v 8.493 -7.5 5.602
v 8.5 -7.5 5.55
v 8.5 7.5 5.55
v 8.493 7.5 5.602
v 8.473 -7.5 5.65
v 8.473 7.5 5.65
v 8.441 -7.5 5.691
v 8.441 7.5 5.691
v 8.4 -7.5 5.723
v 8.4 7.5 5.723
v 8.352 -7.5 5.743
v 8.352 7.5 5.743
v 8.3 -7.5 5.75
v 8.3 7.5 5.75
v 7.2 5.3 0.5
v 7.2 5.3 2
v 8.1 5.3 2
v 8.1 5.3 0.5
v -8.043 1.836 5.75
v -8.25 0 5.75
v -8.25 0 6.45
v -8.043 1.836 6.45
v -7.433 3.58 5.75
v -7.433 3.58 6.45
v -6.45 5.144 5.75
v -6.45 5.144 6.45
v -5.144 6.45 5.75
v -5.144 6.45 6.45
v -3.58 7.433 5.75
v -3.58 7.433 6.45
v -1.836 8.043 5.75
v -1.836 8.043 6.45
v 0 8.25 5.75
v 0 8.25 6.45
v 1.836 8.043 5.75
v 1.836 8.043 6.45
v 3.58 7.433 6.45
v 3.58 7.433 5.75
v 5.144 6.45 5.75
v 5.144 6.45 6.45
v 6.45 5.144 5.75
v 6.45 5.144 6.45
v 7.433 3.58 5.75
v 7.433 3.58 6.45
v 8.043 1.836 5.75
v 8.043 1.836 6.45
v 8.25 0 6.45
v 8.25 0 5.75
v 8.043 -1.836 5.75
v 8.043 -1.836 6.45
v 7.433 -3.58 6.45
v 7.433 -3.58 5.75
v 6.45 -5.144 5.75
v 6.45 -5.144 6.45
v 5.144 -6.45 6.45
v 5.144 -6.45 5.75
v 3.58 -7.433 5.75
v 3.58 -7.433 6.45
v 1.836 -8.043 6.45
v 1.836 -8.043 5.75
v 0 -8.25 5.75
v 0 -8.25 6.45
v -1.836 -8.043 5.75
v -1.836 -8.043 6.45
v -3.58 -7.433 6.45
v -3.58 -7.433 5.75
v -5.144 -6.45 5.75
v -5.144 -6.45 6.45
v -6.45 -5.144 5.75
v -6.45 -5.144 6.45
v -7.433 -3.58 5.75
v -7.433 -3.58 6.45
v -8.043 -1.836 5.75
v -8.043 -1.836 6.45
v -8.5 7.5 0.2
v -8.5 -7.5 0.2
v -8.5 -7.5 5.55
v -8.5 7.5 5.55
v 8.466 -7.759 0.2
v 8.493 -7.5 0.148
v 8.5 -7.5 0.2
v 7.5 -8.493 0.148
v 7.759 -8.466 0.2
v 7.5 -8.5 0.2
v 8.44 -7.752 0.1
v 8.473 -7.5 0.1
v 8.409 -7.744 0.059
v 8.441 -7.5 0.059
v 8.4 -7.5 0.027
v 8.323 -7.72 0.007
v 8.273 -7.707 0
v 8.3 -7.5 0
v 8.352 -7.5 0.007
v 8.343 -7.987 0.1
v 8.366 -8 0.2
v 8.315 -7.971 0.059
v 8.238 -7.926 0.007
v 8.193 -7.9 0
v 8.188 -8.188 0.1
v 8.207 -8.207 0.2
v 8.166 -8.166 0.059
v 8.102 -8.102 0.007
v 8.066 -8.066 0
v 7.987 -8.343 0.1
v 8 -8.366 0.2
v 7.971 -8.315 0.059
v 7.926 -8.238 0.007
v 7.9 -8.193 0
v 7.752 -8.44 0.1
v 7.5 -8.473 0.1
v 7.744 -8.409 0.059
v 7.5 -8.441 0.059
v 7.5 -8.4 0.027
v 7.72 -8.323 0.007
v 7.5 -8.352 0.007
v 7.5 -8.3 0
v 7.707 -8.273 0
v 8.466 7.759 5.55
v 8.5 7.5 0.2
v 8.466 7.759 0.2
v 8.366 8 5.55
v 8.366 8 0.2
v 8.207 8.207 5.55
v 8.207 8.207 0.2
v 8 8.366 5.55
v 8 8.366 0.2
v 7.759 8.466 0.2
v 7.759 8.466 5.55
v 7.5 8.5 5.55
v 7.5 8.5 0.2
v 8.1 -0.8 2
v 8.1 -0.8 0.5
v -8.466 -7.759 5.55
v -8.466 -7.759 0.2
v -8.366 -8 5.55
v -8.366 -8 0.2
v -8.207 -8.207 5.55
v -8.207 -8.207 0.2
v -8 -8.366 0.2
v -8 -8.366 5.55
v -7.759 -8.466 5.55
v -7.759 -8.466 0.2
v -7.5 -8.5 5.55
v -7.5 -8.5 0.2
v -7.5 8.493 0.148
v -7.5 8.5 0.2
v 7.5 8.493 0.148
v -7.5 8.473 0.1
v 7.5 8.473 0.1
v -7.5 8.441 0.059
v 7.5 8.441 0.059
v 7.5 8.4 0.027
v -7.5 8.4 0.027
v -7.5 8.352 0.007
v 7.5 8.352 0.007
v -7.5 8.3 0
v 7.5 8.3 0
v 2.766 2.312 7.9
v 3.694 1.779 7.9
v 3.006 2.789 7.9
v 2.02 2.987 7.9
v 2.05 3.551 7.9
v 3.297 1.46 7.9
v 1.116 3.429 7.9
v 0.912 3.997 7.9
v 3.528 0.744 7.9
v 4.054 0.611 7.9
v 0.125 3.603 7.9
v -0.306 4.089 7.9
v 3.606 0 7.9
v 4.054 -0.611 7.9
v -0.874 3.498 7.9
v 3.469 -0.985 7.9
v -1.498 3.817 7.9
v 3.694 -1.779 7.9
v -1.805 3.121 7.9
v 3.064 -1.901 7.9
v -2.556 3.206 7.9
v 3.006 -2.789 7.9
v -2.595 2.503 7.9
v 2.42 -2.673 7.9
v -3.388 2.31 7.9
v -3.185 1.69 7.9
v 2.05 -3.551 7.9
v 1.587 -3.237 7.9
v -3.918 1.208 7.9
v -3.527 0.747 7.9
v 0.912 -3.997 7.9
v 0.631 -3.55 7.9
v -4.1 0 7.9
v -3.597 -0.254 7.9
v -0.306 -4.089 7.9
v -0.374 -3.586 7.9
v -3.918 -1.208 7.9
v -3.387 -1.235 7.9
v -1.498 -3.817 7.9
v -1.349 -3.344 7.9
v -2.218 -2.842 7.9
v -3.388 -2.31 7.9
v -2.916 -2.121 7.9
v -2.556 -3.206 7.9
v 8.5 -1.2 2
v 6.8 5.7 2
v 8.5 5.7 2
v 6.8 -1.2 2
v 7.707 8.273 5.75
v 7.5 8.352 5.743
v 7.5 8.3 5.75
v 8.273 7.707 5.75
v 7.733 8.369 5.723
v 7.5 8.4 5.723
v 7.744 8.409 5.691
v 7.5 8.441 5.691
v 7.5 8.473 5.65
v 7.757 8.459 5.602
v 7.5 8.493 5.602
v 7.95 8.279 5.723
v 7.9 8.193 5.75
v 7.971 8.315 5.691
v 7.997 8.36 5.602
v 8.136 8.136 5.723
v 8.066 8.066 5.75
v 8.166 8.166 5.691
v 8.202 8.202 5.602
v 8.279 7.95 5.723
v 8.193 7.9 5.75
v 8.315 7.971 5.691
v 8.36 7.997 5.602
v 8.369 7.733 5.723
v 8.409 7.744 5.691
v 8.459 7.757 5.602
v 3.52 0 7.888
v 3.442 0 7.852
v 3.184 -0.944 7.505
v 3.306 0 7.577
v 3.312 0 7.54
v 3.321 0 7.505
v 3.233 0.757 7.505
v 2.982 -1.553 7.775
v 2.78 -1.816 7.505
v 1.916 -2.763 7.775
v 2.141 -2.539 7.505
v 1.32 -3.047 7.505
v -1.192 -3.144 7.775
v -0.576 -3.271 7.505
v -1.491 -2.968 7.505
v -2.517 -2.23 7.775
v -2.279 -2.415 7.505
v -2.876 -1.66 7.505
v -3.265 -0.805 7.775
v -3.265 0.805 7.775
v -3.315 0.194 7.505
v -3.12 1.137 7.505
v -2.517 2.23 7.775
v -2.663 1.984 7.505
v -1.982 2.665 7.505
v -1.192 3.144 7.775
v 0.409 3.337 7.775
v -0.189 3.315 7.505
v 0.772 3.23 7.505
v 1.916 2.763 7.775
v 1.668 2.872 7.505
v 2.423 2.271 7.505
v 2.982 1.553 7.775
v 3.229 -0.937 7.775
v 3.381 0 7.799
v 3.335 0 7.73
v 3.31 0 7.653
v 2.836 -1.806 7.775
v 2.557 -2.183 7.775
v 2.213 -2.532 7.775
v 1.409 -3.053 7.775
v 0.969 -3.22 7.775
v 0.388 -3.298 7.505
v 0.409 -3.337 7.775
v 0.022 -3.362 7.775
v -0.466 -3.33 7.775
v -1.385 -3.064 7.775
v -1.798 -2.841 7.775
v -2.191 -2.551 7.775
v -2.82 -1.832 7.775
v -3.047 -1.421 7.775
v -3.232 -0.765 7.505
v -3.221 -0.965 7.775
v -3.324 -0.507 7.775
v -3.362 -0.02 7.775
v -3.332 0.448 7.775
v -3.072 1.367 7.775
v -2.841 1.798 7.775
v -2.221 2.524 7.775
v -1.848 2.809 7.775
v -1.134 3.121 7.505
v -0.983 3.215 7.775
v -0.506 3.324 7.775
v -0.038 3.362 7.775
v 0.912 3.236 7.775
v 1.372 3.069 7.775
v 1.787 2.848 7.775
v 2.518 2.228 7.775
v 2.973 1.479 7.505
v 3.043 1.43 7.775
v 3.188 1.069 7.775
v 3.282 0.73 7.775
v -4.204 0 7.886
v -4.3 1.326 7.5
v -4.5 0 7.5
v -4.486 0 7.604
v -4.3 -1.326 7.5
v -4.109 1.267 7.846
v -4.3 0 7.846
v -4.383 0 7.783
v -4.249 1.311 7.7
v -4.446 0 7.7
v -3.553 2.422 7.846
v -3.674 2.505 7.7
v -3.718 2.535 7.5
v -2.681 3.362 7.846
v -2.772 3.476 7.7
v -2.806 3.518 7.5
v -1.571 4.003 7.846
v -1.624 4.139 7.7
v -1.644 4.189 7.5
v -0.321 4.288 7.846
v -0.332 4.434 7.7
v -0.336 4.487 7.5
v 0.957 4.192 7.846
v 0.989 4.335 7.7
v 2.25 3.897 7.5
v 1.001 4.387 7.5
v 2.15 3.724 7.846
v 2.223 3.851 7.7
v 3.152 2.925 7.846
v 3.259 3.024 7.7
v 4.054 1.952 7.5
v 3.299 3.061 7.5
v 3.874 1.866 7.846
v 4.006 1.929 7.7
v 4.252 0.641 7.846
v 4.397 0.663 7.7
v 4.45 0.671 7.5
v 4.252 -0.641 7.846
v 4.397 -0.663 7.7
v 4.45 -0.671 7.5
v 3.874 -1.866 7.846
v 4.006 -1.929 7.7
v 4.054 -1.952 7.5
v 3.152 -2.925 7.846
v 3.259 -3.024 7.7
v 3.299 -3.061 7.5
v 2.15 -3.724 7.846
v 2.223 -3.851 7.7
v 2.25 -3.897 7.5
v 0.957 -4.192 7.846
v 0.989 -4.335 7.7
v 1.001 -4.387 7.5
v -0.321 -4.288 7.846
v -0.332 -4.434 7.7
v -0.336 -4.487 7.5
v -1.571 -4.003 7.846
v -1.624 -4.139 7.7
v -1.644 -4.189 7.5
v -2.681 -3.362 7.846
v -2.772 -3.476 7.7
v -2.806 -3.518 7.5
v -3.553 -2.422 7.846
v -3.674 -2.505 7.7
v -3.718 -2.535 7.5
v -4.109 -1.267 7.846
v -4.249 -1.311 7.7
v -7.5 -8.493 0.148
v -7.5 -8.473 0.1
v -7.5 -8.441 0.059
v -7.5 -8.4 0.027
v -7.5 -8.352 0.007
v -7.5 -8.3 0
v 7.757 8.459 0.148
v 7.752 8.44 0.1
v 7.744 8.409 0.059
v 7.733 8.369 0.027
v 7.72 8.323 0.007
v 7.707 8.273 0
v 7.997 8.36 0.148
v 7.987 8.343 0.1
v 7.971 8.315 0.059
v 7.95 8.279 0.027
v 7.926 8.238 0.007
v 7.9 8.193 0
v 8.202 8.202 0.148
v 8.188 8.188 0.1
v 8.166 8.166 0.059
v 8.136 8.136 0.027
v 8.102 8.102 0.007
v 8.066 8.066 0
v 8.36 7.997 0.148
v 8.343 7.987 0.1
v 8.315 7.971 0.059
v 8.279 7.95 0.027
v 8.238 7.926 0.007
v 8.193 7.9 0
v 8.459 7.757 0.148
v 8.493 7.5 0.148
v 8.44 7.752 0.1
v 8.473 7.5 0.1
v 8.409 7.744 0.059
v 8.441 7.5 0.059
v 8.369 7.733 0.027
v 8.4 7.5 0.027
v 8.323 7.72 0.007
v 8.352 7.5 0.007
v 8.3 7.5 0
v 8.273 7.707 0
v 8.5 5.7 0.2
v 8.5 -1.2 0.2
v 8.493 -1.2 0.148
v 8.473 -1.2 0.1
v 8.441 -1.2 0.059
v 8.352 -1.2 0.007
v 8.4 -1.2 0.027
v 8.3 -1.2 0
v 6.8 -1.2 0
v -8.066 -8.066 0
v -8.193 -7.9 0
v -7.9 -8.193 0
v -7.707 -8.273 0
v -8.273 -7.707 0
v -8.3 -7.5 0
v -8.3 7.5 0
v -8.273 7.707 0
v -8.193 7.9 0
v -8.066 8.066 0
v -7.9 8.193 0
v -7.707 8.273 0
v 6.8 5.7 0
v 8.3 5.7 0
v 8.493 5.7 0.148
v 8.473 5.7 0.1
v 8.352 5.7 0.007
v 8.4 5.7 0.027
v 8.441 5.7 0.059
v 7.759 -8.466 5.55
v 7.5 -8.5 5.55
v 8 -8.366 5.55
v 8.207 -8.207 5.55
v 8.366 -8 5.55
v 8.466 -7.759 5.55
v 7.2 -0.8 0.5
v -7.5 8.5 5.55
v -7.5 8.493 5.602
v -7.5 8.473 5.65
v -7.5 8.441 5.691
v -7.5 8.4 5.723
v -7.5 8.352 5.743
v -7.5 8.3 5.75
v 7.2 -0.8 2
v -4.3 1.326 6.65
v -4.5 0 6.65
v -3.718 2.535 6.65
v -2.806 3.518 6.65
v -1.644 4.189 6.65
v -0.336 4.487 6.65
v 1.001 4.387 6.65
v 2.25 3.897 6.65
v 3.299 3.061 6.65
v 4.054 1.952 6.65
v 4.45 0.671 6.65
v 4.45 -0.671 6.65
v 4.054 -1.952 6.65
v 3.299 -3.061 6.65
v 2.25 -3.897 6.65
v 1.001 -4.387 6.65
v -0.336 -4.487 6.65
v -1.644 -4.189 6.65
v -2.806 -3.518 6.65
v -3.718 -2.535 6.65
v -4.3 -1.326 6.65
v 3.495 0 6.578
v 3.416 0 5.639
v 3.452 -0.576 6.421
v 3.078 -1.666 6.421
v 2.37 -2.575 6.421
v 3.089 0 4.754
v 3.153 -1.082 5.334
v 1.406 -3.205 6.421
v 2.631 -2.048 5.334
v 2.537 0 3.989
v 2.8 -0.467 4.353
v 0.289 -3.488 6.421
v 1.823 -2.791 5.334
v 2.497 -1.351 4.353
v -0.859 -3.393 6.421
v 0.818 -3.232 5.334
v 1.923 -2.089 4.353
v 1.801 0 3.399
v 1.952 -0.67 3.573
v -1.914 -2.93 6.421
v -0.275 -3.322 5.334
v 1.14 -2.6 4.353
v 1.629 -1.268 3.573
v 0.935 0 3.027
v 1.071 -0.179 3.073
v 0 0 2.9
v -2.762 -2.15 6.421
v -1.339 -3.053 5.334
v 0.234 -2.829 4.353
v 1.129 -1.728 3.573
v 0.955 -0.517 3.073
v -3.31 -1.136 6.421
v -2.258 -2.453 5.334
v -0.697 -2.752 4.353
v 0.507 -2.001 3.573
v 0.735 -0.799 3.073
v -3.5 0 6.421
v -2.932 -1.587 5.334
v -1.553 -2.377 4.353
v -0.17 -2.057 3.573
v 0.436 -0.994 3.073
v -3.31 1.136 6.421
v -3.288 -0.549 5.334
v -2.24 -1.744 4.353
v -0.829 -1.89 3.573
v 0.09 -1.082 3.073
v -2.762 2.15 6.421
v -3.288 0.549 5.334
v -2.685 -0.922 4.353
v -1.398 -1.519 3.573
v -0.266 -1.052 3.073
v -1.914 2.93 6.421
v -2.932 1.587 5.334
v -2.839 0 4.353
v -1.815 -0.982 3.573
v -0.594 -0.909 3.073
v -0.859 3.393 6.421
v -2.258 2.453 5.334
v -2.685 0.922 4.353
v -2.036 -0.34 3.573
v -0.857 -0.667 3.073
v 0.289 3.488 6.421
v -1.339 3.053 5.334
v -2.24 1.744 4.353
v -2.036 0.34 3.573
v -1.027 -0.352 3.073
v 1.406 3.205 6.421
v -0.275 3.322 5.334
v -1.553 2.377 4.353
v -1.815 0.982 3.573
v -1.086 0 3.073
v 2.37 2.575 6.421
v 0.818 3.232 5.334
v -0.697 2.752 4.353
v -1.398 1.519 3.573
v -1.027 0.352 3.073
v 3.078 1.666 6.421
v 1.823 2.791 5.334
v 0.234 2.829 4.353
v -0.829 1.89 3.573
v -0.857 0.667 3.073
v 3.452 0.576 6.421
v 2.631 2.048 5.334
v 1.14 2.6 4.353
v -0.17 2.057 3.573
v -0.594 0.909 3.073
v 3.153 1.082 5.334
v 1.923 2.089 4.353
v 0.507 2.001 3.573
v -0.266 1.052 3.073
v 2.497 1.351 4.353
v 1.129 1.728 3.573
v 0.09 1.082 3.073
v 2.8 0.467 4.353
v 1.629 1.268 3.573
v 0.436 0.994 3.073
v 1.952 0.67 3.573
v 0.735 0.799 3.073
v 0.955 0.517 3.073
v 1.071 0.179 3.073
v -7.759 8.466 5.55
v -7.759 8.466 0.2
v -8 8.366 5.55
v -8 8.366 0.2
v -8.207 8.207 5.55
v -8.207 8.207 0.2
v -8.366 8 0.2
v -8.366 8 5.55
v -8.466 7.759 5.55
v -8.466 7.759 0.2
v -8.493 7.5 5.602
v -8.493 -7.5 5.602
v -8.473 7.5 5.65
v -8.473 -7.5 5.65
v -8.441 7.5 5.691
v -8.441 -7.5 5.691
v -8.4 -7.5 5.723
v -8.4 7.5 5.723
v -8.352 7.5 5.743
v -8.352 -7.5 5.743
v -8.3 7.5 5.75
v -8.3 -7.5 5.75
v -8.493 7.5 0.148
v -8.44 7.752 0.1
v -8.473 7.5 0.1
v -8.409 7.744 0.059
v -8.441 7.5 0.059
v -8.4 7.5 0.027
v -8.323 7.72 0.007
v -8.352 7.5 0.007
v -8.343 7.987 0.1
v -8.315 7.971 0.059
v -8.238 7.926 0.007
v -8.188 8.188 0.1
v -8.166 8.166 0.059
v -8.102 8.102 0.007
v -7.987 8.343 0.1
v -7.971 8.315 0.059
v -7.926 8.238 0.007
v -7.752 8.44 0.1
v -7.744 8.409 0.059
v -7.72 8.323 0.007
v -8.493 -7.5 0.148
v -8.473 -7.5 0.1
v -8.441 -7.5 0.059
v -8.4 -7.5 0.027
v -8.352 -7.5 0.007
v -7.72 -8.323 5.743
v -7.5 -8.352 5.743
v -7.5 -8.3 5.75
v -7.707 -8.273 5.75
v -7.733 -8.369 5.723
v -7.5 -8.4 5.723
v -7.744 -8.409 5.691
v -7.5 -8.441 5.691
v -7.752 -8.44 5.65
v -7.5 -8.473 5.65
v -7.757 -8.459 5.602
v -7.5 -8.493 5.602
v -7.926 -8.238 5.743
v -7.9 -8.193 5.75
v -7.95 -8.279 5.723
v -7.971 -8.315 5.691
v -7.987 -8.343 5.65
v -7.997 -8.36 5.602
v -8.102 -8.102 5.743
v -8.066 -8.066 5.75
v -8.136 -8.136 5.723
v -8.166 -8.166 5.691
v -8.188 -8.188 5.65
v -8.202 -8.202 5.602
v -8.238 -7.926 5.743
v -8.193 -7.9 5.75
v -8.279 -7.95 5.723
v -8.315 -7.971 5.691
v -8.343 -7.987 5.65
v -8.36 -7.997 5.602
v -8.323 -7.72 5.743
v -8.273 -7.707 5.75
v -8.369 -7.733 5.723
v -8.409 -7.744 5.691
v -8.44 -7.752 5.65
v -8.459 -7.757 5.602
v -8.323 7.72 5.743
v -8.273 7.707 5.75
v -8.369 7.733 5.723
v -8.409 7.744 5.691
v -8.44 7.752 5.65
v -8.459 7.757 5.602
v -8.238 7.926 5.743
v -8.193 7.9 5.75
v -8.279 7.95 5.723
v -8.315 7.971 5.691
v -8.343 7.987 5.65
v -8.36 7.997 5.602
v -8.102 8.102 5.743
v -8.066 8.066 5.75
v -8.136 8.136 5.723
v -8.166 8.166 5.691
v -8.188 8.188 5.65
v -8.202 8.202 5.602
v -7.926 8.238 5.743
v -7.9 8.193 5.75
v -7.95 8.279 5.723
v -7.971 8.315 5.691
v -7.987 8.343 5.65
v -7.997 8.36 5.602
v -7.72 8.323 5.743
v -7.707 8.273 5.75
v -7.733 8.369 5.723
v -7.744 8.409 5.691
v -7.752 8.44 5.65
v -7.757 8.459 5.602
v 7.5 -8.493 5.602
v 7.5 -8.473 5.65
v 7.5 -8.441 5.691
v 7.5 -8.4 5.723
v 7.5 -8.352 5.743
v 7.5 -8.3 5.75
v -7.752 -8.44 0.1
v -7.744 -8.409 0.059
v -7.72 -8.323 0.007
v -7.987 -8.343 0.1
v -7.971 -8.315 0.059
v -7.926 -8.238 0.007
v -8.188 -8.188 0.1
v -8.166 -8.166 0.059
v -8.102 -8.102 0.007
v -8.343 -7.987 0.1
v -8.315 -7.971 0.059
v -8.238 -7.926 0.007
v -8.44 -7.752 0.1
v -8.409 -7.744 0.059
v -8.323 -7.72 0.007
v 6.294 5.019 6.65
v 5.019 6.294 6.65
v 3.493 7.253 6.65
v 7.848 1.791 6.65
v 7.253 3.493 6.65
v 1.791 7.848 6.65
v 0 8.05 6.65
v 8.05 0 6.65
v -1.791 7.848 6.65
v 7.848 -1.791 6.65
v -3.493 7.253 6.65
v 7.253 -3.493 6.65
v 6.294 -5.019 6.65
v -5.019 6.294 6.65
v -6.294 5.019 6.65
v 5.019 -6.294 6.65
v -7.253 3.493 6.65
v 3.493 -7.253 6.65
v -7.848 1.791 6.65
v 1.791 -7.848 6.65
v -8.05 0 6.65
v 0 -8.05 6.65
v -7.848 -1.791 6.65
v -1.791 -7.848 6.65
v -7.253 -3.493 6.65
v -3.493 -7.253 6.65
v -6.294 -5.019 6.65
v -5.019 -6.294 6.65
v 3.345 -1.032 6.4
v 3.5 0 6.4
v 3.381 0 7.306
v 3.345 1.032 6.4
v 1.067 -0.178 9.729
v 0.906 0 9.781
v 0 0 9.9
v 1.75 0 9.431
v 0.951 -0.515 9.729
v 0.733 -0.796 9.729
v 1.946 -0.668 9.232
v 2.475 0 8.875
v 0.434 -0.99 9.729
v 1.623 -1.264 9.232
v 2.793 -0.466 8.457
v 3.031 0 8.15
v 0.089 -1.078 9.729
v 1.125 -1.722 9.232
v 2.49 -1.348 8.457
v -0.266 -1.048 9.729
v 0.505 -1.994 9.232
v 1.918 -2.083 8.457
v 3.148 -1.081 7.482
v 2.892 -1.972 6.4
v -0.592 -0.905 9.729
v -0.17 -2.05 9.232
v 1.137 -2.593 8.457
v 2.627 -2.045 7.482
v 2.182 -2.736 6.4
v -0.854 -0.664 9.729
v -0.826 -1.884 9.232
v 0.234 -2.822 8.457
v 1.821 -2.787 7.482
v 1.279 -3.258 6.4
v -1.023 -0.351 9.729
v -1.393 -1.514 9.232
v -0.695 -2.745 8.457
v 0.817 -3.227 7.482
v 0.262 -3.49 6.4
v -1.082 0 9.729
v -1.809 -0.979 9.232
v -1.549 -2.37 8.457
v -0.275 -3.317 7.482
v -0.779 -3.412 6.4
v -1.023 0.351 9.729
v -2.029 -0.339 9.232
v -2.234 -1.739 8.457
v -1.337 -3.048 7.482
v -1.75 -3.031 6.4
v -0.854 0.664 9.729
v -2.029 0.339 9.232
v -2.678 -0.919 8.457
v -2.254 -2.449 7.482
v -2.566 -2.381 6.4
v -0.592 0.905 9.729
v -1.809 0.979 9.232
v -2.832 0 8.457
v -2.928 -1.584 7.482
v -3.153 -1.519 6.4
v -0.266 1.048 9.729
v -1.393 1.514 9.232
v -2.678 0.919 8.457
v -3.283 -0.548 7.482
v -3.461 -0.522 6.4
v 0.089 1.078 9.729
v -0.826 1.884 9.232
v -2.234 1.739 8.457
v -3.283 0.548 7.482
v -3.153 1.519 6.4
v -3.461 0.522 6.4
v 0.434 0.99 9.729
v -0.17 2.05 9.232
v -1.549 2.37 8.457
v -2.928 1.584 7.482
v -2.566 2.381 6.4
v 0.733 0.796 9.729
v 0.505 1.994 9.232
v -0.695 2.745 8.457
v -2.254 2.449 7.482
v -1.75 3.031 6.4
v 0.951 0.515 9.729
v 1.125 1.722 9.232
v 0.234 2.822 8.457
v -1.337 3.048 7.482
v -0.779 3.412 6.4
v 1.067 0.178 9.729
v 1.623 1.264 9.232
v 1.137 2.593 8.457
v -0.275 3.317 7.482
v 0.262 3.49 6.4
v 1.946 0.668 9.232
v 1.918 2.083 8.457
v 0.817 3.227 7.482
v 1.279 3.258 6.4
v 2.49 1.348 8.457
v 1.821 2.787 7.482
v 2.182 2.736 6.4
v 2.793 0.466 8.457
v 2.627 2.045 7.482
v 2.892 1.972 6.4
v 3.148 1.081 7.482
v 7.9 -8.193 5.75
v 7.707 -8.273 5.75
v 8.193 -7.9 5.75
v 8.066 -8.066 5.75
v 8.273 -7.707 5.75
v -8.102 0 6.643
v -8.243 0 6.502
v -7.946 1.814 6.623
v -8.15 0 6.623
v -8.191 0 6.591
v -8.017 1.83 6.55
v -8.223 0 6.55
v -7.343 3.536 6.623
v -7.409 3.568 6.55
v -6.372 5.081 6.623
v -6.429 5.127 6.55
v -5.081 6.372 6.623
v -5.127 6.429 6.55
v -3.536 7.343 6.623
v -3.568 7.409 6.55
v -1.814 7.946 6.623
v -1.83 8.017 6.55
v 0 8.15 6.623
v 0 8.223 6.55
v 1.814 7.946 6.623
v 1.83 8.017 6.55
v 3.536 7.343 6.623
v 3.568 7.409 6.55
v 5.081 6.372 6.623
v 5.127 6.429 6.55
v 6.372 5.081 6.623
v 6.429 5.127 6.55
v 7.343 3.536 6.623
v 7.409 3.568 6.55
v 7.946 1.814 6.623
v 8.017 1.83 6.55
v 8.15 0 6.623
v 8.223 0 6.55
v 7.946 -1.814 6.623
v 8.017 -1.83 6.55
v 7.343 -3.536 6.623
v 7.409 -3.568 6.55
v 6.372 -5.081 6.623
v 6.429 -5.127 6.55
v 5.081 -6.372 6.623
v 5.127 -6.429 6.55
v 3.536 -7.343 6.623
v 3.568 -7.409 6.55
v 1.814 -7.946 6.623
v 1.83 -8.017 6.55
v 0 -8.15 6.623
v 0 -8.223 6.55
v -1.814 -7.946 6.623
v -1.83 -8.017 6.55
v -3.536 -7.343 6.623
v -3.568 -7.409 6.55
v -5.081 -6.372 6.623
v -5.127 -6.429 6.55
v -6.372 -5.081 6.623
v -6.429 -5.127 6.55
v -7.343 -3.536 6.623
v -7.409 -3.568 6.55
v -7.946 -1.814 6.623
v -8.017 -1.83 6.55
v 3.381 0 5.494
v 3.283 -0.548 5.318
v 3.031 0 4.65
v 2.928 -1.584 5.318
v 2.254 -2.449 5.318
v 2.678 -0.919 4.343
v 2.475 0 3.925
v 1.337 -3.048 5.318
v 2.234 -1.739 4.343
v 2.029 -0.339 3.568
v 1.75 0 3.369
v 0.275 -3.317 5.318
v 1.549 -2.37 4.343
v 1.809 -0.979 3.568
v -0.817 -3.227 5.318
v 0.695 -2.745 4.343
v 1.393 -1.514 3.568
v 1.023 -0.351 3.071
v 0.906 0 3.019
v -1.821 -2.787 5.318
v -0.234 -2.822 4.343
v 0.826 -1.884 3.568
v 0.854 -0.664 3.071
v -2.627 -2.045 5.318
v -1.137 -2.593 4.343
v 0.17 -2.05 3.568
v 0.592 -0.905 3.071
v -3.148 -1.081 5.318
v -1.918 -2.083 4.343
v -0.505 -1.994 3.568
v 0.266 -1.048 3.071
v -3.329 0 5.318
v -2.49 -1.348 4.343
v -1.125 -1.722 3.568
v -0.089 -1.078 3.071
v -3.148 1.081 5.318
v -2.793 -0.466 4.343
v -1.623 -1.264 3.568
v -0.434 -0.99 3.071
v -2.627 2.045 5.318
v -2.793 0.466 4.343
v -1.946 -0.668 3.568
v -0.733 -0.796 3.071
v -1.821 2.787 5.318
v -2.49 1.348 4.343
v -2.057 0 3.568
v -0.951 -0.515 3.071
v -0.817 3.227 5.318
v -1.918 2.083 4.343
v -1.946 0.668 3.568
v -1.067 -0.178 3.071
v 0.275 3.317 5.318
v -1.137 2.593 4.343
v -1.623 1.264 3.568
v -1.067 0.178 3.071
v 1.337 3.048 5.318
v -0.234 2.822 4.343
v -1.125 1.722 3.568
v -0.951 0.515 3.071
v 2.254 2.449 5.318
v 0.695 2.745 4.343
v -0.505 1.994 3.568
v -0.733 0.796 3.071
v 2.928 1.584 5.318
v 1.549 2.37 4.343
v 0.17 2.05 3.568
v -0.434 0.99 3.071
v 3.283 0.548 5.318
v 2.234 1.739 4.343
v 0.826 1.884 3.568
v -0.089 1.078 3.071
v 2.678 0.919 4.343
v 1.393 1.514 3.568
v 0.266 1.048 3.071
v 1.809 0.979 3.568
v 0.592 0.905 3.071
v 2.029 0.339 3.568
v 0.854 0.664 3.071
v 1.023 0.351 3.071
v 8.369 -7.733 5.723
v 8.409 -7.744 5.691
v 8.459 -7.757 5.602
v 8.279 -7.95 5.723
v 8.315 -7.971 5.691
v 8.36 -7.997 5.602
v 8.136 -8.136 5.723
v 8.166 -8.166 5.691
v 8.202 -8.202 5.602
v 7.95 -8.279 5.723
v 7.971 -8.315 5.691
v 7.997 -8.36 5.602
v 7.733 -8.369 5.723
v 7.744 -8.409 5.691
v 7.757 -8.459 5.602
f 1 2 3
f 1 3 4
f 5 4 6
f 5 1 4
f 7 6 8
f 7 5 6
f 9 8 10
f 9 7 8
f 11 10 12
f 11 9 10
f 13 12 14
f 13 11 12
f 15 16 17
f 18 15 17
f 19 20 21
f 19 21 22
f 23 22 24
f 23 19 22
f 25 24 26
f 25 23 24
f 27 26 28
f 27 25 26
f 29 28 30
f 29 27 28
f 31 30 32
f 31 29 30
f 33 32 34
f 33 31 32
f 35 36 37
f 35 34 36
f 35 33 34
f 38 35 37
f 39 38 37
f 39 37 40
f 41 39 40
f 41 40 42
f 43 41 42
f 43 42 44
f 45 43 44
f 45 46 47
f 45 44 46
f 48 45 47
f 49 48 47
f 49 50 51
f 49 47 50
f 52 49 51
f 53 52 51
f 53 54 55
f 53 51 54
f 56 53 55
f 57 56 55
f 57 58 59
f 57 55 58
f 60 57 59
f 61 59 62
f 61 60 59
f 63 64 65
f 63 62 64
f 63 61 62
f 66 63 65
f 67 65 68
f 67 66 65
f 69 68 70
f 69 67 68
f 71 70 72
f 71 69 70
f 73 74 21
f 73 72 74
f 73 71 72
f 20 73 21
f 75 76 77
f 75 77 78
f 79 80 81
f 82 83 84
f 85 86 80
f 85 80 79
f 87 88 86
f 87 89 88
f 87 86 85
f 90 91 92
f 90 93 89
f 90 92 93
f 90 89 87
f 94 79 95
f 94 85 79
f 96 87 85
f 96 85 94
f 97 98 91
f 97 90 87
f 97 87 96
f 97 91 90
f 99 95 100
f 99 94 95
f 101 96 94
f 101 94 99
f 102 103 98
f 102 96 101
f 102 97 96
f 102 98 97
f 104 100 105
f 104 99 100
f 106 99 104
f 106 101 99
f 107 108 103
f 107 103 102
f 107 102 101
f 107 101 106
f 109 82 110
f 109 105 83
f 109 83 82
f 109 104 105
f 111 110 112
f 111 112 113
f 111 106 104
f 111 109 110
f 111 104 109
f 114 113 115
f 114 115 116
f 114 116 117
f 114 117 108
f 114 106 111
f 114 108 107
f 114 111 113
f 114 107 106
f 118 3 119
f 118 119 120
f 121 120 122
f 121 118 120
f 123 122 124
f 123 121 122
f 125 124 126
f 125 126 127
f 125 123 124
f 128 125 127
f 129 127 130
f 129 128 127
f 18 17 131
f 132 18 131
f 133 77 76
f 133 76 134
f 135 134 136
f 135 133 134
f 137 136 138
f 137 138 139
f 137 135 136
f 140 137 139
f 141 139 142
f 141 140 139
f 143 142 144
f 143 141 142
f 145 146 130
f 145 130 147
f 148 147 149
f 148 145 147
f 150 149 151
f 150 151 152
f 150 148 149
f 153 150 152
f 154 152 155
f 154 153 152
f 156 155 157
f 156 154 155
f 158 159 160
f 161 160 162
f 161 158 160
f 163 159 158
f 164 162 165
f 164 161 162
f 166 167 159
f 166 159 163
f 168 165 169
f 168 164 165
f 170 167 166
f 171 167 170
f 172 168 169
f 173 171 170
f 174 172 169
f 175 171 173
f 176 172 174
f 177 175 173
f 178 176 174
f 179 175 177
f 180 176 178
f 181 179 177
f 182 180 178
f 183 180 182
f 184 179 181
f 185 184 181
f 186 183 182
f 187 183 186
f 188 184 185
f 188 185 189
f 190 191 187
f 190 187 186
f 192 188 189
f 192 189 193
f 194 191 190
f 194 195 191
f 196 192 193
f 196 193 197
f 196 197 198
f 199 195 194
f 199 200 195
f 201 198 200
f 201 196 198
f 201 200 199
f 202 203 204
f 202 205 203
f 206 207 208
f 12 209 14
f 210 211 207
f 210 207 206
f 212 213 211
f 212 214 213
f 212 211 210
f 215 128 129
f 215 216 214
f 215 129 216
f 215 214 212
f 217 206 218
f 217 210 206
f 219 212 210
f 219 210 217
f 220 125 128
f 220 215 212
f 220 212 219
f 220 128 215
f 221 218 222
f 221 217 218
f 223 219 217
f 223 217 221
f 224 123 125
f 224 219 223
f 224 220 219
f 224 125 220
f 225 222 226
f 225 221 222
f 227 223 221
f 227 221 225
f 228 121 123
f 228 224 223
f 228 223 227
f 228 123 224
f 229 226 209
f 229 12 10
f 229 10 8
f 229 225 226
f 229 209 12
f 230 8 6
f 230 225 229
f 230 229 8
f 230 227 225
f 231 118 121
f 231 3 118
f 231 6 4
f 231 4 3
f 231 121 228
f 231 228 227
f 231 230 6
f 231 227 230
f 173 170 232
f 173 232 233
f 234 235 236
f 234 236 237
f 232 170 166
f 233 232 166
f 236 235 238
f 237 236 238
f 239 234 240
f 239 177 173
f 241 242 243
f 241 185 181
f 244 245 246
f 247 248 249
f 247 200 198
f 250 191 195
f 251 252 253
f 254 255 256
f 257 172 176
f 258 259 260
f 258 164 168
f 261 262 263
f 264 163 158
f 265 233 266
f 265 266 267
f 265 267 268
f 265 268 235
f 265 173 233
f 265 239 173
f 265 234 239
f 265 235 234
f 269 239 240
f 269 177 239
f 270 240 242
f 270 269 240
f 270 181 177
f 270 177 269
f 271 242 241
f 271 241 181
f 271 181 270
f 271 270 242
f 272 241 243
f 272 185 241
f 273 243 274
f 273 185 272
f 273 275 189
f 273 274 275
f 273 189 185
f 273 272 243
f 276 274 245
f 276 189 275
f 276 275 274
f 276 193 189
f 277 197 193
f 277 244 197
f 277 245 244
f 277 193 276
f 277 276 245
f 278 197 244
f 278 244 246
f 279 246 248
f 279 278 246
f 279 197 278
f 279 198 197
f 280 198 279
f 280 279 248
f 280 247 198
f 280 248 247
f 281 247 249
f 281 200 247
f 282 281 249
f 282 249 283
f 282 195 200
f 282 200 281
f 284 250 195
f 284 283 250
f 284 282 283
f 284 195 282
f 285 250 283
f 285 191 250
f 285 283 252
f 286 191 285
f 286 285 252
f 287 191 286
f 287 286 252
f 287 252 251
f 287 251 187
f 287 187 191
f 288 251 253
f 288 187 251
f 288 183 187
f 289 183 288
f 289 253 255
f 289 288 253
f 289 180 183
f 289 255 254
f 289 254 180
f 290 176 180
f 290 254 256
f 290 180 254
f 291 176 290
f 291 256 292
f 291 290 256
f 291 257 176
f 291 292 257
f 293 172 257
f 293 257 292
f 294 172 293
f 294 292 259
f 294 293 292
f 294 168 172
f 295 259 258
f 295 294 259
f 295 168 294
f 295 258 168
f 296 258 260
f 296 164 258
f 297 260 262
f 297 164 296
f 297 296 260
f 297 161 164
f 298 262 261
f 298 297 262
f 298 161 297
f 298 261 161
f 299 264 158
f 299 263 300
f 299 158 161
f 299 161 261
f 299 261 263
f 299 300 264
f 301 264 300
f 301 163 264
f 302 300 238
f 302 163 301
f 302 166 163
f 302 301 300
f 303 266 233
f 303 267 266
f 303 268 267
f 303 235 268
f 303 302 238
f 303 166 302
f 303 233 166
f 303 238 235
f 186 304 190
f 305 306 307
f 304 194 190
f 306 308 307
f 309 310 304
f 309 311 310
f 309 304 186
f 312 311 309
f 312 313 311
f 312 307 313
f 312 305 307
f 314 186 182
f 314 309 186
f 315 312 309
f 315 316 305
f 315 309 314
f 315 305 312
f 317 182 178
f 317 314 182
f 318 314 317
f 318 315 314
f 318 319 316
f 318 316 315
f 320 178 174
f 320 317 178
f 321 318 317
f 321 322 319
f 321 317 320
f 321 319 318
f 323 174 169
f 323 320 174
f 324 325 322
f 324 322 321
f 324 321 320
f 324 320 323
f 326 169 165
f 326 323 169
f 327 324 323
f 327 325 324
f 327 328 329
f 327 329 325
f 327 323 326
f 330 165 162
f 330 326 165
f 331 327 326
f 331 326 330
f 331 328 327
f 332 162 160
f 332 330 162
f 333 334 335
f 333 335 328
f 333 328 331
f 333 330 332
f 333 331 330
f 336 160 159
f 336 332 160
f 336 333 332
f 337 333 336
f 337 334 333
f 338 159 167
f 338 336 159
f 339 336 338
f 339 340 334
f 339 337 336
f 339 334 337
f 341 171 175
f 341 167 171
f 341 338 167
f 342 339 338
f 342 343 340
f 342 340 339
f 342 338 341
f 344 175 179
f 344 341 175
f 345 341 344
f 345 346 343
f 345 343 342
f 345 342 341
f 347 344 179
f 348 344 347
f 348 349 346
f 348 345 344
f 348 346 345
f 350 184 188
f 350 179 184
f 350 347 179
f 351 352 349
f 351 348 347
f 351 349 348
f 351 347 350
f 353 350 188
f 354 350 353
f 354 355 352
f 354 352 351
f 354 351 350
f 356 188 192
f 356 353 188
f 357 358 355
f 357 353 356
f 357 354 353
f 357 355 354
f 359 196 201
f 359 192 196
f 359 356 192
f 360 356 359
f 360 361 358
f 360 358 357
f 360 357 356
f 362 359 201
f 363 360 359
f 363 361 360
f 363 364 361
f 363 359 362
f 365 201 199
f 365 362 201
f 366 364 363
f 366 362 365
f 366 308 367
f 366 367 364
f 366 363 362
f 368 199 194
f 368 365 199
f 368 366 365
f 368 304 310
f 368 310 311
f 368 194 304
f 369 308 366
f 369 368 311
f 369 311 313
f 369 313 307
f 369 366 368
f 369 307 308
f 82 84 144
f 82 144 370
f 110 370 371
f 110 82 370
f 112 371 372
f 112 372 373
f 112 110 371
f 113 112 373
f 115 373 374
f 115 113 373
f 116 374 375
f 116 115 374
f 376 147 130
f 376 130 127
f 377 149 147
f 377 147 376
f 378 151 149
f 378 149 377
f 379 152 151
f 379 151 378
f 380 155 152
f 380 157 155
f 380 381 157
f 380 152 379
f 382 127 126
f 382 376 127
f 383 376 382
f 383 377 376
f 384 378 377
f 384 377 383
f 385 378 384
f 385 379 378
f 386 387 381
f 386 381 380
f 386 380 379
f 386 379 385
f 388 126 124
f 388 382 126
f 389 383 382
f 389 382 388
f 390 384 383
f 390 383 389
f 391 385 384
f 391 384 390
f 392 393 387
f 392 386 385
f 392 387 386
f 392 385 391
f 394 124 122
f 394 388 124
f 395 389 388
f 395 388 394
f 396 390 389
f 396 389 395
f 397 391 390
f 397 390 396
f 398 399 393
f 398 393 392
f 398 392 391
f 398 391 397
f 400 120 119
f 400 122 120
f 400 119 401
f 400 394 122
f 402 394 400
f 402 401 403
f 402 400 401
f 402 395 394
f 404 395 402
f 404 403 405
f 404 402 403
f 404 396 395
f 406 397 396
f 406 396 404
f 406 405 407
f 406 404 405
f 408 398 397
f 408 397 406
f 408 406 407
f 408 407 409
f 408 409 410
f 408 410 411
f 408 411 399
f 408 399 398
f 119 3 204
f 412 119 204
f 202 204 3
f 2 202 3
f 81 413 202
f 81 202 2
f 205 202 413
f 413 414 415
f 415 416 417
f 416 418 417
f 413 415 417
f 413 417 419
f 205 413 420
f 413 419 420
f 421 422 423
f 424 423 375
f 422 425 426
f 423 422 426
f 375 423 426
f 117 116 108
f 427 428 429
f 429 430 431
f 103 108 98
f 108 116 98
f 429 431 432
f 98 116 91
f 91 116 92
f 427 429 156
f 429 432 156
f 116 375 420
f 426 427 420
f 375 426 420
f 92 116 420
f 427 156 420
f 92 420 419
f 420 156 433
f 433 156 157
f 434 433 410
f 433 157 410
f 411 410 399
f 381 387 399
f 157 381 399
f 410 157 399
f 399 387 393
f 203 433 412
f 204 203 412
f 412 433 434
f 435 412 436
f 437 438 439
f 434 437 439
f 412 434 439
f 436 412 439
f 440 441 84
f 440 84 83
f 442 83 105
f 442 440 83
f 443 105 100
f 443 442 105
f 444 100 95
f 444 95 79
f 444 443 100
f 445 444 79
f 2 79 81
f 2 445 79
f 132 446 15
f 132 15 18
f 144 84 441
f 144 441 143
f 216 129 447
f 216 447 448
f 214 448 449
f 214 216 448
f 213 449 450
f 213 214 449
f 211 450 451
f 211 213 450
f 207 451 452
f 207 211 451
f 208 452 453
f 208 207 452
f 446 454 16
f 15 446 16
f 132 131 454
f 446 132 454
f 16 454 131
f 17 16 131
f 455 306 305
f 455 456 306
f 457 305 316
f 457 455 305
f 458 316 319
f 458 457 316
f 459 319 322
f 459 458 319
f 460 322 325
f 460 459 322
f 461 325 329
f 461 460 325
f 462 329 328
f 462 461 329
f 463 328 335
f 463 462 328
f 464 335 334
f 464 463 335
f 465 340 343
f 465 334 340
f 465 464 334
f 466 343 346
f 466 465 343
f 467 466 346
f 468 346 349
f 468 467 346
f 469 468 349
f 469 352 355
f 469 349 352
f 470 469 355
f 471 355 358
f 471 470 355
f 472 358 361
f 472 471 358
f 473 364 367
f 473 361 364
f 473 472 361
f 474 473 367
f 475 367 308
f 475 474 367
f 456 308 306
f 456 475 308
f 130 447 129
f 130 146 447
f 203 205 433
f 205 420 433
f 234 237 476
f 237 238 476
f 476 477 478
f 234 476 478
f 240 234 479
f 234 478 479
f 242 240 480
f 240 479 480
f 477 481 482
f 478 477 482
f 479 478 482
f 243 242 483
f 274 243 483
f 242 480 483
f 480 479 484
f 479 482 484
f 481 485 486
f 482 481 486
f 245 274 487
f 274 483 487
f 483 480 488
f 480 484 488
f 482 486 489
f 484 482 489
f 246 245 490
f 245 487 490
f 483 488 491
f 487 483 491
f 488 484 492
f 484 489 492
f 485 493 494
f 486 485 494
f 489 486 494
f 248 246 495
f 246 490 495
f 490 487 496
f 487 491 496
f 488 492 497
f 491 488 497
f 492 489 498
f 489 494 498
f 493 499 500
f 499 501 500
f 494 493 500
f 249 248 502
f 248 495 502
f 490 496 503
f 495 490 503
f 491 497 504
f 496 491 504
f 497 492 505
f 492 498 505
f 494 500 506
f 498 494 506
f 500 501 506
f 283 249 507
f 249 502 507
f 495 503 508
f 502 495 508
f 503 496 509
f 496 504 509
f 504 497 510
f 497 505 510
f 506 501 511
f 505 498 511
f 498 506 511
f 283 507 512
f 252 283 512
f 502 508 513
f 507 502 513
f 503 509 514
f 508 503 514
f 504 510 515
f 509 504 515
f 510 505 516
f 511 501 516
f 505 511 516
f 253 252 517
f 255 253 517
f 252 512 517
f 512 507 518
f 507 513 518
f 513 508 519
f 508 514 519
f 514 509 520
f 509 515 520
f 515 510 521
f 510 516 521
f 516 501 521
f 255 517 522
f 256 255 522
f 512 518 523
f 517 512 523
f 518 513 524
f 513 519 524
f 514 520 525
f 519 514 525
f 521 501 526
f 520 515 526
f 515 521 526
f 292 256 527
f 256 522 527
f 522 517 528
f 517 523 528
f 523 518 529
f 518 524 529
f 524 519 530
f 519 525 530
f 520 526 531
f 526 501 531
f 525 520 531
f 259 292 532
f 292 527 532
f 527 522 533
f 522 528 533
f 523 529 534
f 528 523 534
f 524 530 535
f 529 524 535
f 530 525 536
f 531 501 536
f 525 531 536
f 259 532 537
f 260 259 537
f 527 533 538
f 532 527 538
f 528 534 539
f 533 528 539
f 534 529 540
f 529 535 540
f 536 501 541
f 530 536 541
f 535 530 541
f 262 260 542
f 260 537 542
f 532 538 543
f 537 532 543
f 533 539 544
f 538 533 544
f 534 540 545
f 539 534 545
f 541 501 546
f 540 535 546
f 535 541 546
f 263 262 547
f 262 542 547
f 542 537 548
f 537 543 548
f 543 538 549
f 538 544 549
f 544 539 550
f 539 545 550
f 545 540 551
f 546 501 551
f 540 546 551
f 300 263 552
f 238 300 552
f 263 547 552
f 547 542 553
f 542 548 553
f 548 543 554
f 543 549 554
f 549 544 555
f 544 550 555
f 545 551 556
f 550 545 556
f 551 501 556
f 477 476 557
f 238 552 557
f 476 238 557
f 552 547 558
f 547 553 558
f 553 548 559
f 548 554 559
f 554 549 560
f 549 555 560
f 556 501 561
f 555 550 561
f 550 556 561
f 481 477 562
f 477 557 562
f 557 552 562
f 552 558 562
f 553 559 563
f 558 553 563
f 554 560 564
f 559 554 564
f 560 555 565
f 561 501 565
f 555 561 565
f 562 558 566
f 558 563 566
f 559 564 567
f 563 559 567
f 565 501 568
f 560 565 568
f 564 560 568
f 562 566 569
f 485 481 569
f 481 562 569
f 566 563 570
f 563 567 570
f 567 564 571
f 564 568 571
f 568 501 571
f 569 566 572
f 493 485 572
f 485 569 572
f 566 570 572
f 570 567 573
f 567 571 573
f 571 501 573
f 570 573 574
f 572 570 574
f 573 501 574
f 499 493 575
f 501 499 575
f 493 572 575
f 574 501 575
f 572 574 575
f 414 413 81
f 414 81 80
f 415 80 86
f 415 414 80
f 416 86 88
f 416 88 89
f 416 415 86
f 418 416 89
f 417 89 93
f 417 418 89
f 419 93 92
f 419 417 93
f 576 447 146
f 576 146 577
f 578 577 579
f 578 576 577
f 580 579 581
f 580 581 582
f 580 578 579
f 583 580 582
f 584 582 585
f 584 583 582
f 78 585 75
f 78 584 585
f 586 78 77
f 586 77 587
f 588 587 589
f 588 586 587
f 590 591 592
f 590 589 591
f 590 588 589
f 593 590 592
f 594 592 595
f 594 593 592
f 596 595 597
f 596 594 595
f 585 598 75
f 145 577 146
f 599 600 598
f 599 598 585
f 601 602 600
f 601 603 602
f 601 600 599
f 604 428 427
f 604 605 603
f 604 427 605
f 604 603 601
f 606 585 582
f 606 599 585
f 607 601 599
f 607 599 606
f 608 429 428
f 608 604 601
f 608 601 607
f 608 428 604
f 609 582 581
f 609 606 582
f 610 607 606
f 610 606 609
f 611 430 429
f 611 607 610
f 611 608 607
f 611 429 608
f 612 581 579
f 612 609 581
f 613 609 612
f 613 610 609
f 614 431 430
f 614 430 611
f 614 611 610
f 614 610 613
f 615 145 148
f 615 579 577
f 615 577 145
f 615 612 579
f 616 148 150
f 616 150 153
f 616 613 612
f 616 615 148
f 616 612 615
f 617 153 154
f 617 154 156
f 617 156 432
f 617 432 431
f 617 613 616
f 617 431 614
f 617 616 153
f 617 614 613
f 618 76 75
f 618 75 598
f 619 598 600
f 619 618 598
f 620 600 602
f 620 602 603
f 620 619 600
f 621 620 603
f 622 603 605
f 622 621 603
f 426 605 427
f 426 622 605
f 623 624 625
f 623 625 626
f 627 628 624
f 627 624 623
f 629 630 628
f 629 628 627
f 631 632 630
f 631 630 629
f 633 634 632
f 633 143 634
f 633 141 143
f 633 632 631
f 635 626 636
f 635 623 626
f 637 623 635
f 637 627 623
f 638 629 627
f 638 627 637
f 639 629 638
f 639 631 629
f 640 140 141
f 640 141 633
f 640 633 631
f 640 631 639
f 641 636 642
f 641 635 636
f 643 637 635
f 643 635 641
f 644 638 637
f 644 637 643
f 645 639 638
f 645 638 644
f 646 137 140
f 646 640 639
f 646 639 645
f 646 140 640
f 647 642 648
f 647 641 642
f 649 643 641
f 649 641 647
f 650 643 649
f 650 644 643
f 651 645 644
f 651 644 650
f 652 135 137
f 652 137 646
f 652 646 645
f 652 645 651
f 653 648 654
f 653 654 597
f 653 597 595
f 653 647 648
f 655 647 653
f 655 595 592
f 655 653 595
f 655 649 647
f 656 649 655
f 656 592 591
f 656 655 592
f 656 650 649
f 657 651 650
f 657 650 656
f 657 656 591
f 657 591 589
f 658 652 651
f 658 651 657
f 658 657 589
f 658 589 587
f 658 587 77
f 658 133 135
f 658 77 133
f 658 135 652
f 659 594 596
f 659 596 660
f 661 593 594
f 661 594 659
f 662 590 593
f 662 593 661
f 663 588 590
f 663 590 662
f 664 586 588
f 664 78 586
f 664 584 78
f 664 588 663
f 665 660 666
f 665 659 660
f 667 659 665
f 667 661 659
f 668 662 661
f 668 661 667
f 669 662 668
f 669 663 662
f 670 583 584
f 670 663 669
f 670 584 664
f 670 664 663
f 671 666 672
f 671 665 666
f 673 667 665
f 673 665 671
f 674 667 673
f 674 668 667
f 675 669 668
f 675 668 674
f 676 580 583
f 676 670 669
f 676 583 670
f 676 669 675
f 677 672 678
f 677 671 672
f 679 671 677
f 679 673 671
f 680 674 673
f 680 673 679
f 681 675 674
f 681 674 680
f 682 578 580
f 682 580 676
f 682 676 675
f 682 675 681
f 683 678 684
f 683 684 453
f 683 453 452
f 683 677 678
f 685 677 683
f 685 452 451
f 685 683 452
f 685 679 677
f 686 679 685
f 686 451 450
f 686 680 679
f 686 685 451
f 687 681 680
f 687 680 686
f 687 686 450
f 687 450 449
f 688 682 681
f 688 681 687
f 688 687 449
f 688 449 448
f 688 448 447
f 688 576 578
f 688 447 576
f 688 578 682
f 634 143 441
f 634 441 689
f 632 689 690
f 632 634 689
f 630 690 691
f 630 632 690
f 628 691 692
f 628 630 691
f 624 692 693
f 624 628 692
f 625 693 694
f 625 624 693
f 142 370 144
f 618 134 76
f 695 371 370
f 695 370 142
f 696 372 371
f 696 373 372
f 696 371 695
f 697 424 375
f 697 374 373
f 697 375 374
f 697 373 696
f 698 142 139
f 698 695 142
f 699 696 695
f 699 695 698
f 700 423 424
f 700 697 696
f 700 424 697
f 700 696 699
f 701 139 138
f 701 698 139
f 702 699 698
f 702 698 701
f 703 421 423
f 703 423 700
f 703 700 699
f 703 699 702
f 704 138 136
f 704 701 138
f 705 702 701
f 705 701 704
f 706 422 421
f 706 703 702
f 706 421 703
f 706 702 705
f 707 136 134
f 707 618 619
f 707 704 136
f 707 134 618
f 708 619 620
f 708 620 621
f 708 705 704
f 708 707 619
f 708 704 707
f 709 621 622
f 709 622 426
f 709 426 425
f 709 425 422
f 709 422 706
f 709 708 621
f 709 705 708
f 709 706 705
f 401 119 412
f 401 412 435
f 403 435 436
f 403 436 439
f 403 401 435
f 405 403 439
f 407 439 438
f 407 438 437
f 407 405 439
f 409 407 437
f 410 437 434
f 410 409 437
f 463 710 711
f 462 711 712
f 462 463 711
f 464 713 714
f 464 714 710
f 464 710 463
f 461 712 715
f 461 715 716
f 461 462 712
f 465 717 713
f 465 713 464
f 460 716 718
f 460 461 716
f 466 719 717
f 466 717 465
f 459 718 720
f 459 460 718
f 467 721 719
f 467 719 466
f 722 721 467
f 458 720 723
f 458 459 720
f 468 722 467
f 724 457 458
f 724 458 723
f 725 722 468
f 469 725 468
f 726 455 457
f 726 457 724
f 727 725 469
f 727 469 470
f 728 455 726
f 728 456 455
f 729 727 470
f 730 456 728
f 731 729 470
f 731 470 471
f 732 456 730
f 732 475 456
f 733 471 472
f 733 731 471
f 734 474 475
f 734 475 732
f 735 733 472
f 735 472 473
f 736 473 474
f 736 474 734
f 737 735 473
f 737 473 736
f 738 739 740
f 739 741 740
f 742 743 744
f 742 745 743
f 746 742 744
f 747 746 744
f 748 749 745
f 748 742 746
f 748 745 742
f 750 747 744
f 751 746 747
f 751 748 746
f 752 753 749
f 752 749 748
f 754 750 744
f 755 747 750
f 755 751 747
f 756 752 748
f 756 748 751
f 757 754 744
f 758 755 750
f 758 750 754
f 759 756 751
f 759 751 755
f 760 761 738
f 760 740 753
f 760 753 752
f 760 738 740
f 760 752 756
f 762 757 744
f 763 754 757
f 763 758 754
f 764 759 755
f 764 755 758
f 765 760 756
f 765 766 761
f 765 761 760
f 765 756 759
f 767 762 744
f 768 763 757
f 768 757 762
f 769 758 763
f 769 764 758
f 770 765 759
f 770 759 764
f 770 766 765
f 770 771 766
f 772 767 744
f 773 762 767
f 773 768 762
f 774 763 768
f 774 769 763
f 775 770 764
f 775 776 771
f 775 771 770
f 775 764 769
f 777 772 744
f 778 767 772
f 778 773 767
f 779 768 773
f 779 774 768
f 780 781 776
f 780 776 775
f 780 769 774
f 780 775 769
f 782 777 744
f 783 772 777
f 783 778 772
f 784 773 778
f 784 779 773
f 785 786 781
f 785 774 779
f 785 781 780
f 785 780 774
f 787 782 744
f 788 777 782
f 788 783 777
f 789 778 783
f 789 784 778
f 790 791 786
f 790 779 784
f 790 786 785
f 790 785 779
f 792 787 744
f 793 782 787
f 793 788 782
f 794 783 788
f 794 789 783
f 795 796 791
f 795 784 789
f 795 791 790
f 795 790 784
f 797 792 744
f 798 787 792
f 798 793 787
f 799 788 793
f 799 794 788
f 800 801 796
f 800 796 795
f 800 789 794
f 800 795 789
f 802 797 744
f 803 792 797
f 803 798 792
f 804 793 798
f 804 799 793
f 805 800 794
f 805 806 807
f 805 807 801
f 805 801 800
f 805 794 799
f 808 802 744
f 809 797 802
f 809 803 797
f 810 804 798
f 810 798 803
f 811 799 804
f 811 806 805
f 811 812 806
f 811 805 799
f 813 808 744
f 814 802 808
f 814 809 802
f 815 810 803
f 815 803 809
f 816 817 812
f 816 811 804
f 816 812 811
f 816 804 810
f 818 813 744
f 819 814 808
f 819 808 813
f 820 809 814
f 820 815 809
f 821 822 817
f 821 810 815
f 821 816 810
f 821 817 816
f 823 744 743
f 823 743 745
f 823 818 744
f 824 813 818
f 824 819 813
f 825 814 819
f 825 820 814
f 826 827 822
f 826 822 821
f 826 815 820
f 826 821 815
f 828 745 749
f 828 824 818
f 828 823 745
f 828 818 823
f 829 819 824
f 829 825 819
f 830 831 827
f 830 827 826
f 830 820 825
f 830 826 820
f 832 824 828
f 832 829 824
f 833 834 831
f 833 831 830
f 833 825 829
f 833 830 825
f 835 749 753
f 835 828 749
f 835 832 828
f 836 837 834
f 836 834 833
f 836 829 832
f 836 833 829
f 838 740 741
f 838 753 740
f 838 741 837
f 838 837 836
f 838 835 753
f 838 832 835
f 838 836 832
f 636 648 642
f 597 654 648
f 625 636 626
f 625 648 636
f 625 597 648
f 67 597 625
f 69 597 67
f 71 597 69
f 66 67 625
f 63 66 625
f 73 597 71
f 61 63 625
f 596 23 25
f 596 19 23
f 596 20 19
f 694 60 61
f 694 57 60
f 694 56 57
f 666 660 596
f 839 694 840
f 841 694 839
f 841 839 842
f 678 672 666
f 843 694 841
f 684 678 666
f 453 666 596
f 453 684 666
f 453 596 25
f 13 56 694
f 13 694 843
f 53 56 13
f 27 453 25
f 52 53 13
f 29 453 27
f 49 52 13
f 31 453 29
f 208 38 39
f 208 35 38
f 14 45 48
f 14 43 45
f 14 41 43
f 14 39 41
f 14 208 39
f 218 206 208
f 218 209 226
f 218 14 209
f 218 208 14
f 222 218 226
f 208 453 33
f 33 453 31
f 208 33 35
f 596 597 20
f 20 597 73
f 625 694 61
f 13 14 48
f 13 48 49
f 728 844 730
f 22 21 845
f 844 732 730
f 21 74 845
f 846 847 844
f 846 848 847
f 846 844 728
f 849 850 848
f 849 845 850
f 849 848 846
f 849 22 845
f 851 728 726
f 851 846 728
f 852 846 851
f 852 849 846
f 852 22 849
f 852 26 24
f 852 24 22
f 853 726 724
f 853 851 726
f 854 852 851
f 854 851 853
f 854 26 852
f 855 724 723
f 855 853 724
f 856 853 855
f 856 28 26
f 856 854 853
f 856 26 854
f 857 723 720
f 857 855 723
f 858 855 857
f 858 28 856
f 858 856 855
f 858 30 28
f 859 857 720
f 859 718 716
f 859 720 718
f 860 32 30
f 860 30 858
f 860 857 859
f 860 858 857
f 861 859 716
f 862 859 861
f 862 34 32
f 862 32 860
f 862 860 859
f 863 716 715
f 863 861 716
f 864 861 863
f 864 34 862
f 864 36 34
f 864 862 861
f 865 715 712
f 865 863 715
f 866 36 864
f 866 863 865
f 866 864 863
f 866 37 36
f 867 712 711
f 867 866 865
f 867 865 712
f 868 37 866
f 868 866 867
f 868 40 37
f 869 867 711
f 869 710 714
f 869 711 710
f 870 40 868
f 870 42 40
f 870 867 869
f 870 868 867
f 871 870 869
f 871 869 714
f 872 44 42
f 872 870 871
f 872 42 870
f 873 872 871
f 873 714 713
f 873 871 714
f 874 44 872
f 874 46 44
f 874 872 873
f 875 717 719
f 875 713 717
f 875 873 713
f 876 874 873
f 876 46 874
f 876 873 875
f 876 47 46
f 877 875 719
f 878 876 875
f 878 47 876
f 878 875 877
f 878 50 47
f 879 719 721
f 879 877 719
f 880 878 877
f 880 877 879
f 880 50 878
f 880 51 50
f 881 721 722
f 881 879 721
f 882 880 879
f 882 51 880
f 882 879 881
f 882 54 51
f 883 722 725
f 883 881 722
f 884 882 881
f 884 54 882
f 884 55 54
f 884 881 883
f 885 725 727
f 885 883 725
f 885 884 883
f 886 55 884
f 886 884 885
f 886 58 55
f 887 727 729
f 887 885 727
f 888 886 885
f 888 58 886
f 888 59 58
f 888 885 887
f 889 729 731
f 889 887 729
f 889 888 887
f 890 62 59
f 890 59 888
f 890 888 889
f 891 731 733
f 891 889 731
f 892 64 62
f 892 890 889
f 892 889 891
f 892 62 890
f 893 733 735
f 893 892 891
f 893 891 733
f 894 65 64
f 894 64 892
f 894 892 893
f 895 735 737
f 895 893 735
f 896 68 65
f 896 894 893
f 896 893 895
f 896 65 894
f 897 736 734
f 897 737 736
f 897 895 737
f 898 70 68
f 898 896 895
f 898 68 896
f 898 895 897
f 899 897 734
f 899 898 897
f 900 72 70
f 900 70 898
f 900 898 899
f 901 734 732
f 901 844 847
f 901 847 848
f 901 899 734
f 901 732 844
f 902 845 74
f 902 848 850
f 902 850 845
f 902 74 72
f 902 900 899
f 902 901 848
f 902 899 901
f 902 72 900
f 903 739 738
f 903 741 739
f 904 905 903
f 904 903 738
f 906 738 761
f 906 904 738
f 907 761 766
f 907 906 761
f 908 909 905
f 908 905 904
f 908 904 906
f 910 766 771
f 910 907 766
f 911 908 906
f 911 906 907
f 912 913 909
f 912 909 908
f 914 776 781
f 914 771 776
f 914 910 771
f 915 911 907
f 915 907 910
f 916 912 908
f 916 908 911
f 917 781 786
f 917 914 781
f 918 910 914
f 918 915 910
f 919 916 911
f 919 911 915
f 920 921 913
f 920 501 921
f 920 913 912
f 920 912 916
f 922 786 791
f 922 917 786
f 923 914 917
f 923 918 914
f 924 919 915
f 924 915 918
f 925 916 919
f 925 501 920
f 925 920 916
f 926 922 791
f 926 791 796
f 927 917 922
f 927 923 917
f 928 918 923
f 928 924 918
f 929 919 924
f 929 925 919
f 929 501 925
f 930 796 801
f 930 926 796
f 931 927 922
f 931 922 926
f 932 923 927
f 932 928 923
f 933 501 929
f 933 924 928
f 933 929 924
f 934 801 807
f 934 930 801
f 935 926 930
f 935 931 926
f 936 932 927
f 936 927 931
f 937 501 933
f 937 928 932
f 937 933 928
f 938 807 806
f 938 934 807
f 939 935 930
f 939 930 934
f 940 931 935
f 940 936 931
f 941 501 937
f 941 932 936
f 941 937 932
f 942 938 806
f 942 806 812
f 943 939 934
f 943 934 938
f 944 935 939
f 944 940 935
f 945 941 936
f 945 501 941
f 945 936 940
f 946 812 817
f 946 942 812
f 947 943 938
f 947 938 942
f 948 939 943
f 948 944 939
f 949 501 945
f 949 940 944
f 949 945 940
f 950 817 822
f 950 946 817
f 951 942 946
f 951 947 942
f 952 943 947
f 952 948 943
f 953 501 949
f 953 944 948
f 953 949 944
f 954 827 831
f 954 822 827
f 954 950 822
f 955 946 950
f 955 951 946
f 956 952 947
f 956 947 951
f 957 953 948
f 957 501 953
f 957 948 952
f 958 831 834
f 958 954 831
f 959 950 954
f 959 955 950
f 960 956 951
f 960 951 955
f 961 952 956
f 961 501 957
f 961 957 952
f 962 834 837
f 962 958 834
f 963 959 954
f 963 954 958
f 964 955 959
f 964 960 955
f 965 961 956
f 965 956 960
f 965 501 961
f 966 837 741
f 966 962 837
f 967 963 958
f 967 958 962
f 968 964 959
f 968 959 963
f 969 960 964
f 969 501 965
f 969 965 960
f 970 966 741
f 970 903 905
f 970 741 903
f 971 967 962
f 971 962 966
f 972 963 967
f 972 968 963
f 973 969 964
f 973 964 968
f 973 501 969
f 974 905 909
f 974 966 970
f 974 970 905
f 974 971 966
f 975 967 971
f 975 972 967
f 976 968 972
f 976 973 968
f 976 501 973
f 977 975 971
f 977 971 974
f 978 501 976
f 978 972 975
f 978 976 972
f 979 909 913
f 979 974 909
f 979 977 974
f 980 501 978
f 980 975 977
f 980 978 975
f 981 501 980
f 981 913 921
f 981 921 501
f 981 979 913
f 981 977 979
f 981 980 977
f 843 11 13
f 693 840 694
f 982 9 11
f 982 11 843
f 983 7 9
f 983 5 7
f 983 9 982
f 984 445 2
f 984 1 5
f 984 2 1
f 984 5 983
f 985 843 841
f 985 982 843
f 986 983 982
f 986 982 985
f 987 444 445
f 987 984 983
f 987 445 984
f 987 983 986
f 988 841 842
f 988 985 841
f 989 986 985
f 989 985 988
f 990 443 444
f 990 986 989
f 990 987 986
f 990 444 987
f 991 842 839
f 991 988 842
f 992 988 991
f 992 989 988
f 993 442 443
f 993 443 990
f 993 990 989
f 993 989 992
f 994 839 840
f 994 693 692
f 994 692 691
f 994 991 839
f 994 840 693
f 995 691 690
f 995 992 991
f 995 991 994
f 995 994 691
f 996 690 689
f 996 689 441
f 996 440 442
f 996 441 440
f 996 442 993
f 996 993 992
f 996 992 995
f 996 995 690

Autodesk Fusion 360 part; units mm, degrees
sketch "Skizze1" plane through (0, 0, 0) normal (0, 0, 1) x (1, 0, 0)
  line L0 (8.5, -8.5) -> (-8.5, -8.5)
  line L1 (-8.5, -8.5) -> (-8.5, 8.5)
  line L2 (-8.5, 8.5) -> (8.5, 8.5)
  line L3 (8.5, 8.5) -> (8.5, -8.5)
  line L4 (8.5, -8.5) -> (-8.5, 8.5) construction
  line L5 (-8.5, -8.5) -> (8.5, 8.5) construction
  dimension "d1" = 17
  dimension "d2" = 17
extrude "Extrusion1" add sketch "Skizze1" along normal blind 5.75 makes body 1
sketch "Skizze2" plane through (0, 0, 5.75) normal (0, 0, 1) x (-1, 0, 0)
  line L0 (-8.5, -8.5) -> (8.5, -8.5)
  line L1 (8.5, -8.5) -> (8.5, 8.5)
  line L2 (8.5, 8.5) -> (-8.5, 8.5)
  line L3 (-8.5, 8.5) -> (-8.5, -8.5)
  circle A0 centre (0, 0) radius 8.25
  dimension "d5" = 16.5
extrude "Extrusion2" add sketch "Skizze2" along normal blind 0.9 contours A0 bodies 1
sketch "Skizze3" plane through (0, 0, 6.65) normal (0, 0, 1) x (-1, 0, 0)
  circle A0 centre (0, 0) radius 8.25
  circle A1 centre (0, 0) radius 4.5
  dimension "d8" = 9
extrude "Extrusion3" add sketch "Skizze3" along normal blind 1.25 contours A1 bodies 1
sketch "Skizze4" plane through (0, 0, 0) normal (0, 1, 0) x (1, 0, 0)
  circle A0 centre (0, -6.4) radius 3.5
  line L0 (-8.5, 0) -> (8.5, 0)
  line L1 (0, 0) -> (0, -9.9) construction
  line L2 (0, -9.9) -> (0, -2.9)
  dimension "d11" = 7
  dimension "d12" = 9.9
revolve "Drehen1" add sketch "Skizze4" angle 360 about axis through (0, 0, 0) along (0, 0, 1) separate body contours A0 L2 picked at (1.5391, -5.636) makes body 2
combine "Kombinieren1" operation cut target body 1 tool bodies 2 keep tools
fillet "Abrundung1" radius 0.3 1 edges at (-1.1435, -2.9483, 7.9) on bodies 1
fillet "Abrundung2" radius 0.4 1 edges at (4.1955, 1.6273, 7.9) on bodies 1
fillet "Abrundung3" radius 0.2 1 edges at (7.6917, 2.9833, 6.65) on bodies 1
fillet "Abrundung4" radius 1 4 edges at (-8.5, -8.5, 2.875) (8.5, -8.5, 2.875) (8.5, 8.5, 2.875) (-8.5, 8.5, 2.875) on bodies 1
fillet "Abrundung5" radius 0.2 16 edges at (-8.2071, 8.2071, 5.75) (-8.5, 0, 5.75) (-8.2071, -8.2071, 5.75) (0, -8.5, 5.75) (8.2071, -8.2071, 5.75) (8.5, 0, 5.75) (8.2071, 8.2071, 5.75) (0, 8.5, 5.75) (8.2071, 8.2071, 0) (8.5, 0, 0) (8.2071, -8.2071, 0) (0, -8.5, 0) (-8.2071, -8.2071, 0) (-8.5, 0, 0) (-8.2071, 8.2071, 0) (0, 8.5, 0) on bodies 1
sketch "Skizze5" plane through (0, 0, 0) normal (0, 0, -1) x (1, 0, 0)
  arc A0 (7.5, -8.3) -> (8.3, -7.5) centre (7.5, -7.5) ccw
  line L0 (8.3, -7.5) -> (8.3, 7.5)
  arc A1 (8.3, 7.5) -> (7.5, 8.3) centre (7.5, 7.5) ccw
  line L1 (7.5, 8.3) -> (-7.5, 8.3)
  arc A2 (-7.5, 8.3) -> (-8.3, 7.5) centre (-7.5, 7.5) ccw
  line L2 (-8.3, 7.5) -> (-8.3, -7.5)
  arc A3 (-8.3, -7.5) -> (-7.5, -8.3) centre (-7.5, -7.5) ccw
  line L3 (-7.5, -8.3) -> (7.5, -8.3)
  line L4 (8.3, 1.2) -> (6.8, 1.2)
  line L5 (6.8, 1.2) -> (6.8, -5.7)
  line L6 (6.8, -5.7) -> (8.3, -5.7)
  line L7 (8.3, -5.7) -> (8.3, 1.2)
  line L8 (6.8, 1.2) -> (9.6497, 1.2)
  line L9 (9.6497, 1.2) -> (9.6497, -5.7)
  line L10 (9.6497, -5.7) -> (6.8, -5.7)
  line L11 (6.8, -5.7) -> (6.8, 1.2)
  dimension "d24" = 9.5
  dimension "d25" = 14
  dimension "d26" = 1.5
extrude "Extrusion4" cut sketch "Skizze5" against normal blind 2 contours L0 L4 L5 L6 L7 L8 L10 L11 | L0 L7 L8 L9 L10 bodies 1
sketch "Skizze6" plane through (0, 0, 2) normal (0, 0, -1) x (1, 0, 0)
  line L0 (8.5, -5.7) -> (8.5, 1.2)
  line L1 (8.5, 1.2) -> (6.8, 1.2)
  line L2 (6.8, 1.2) -> (6.8, -5.7)
  line L3 (6.8, -5.7) -> (8.5, -5.7)
  line L4 (7.2, 0.8) -> (7.2, -5.3)
  line L5 (7.2, -5.3) -> (8.1, -5.3)
  line L6 (8.1, -5.3) -> (8.1, 0.8)
  line L7 (8.1, 0.8) -> (7.2, 0.8)
  dimension "d30" = -0.4
extrude "Extrusion5" add sketch "Skizze6" along normal blind 1.5 separate body contours L4 L5 L6 L7 makes body 3
sketch "Skizze7" plane through (8.1, 0, 0) normal (1, 0, 0) x (0, 1, 0)
  line L0 (5.3, 2) -> (-0.8, 2)
  line L1 (-0.8, 2) -> (-0.8, 0.5)
  line L2 (-0.8, 0.5) -> (5.3, 0.5)
  line L3 (5.3, 0.5) -> (5.3, 2)
sketch "Skizze8" plane through (8.1, 0, 0) normal (1, 0, 0) x (0, 1, 0)
equation "d6 = 6.65 mm - 5.75 mm"
equation "d9 = 7.9 mm - 6.65 mm"
